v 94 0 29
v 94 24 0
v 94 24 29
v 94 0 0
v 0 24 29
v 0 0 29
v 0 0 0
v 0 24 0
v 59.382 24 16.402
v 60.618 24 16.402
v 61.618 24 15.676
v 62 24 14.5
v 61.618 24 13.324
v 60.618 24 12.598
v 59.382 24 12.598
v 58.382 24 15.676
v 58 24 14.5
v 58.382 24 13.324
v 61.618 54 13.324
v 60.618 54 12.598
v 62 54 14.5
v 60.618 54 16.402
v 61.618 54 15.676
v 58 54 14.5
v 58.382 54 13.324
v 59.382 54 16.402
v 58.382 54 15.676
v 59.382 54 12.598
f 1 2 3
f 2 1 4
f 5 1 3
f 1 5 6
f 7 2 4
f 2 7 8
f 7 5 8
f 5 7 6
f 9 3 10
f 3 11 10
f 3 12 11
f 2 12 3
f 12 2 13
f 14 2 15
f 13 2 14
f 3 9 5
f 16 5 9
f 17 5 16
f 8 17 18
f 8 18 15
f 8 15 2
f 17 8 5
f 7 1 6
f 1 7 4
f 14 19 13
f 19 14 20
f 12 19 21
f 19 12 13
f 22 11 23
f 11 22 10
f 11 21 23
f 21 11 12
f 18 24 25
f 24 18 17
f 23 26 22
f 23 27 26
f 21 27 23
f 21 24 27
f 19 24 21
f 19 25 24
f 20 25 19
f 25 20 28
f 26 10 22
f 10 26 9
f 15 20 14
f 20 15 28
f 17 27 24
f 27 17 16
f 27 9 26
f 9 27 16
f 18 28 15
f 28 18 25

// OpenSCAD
// file: params_webcam.scad
// Author: Mihai Oltean, www.tcreate.org, mihai.oltean@gmail.com
// More details: jenny5.org
// Source: github.com/jenny5-robot
// MIT License
//--------------------------------------------------------------

c920_length = 94;
c920_height = 29;
c920_depth = 24;

c920_size = [c920_length, c920_depth, c920_height];

c920_dist_between_holder_holes = 64.25;

c920_dist_to_cable = 34;
// main file
// Author: Mihai Oltean, www.tcreate.org, mihai.oltean@gmail.com
// More details: jenny5.org
// Source: github.com/jenny5-robot
// MIT License
//--------------------------------------------------------------
include <params_webcam.scad>

module c920()
{
    color ("black") cube(c920_size);
    // cable
    color ("black") translate([c920_length - c920_dist_to_cable, c920_depth, c920_height / 2]) rotate([-90, 0, 0]) cylinder (h = 30, r = 2, $fn = 10);
}

c920();
